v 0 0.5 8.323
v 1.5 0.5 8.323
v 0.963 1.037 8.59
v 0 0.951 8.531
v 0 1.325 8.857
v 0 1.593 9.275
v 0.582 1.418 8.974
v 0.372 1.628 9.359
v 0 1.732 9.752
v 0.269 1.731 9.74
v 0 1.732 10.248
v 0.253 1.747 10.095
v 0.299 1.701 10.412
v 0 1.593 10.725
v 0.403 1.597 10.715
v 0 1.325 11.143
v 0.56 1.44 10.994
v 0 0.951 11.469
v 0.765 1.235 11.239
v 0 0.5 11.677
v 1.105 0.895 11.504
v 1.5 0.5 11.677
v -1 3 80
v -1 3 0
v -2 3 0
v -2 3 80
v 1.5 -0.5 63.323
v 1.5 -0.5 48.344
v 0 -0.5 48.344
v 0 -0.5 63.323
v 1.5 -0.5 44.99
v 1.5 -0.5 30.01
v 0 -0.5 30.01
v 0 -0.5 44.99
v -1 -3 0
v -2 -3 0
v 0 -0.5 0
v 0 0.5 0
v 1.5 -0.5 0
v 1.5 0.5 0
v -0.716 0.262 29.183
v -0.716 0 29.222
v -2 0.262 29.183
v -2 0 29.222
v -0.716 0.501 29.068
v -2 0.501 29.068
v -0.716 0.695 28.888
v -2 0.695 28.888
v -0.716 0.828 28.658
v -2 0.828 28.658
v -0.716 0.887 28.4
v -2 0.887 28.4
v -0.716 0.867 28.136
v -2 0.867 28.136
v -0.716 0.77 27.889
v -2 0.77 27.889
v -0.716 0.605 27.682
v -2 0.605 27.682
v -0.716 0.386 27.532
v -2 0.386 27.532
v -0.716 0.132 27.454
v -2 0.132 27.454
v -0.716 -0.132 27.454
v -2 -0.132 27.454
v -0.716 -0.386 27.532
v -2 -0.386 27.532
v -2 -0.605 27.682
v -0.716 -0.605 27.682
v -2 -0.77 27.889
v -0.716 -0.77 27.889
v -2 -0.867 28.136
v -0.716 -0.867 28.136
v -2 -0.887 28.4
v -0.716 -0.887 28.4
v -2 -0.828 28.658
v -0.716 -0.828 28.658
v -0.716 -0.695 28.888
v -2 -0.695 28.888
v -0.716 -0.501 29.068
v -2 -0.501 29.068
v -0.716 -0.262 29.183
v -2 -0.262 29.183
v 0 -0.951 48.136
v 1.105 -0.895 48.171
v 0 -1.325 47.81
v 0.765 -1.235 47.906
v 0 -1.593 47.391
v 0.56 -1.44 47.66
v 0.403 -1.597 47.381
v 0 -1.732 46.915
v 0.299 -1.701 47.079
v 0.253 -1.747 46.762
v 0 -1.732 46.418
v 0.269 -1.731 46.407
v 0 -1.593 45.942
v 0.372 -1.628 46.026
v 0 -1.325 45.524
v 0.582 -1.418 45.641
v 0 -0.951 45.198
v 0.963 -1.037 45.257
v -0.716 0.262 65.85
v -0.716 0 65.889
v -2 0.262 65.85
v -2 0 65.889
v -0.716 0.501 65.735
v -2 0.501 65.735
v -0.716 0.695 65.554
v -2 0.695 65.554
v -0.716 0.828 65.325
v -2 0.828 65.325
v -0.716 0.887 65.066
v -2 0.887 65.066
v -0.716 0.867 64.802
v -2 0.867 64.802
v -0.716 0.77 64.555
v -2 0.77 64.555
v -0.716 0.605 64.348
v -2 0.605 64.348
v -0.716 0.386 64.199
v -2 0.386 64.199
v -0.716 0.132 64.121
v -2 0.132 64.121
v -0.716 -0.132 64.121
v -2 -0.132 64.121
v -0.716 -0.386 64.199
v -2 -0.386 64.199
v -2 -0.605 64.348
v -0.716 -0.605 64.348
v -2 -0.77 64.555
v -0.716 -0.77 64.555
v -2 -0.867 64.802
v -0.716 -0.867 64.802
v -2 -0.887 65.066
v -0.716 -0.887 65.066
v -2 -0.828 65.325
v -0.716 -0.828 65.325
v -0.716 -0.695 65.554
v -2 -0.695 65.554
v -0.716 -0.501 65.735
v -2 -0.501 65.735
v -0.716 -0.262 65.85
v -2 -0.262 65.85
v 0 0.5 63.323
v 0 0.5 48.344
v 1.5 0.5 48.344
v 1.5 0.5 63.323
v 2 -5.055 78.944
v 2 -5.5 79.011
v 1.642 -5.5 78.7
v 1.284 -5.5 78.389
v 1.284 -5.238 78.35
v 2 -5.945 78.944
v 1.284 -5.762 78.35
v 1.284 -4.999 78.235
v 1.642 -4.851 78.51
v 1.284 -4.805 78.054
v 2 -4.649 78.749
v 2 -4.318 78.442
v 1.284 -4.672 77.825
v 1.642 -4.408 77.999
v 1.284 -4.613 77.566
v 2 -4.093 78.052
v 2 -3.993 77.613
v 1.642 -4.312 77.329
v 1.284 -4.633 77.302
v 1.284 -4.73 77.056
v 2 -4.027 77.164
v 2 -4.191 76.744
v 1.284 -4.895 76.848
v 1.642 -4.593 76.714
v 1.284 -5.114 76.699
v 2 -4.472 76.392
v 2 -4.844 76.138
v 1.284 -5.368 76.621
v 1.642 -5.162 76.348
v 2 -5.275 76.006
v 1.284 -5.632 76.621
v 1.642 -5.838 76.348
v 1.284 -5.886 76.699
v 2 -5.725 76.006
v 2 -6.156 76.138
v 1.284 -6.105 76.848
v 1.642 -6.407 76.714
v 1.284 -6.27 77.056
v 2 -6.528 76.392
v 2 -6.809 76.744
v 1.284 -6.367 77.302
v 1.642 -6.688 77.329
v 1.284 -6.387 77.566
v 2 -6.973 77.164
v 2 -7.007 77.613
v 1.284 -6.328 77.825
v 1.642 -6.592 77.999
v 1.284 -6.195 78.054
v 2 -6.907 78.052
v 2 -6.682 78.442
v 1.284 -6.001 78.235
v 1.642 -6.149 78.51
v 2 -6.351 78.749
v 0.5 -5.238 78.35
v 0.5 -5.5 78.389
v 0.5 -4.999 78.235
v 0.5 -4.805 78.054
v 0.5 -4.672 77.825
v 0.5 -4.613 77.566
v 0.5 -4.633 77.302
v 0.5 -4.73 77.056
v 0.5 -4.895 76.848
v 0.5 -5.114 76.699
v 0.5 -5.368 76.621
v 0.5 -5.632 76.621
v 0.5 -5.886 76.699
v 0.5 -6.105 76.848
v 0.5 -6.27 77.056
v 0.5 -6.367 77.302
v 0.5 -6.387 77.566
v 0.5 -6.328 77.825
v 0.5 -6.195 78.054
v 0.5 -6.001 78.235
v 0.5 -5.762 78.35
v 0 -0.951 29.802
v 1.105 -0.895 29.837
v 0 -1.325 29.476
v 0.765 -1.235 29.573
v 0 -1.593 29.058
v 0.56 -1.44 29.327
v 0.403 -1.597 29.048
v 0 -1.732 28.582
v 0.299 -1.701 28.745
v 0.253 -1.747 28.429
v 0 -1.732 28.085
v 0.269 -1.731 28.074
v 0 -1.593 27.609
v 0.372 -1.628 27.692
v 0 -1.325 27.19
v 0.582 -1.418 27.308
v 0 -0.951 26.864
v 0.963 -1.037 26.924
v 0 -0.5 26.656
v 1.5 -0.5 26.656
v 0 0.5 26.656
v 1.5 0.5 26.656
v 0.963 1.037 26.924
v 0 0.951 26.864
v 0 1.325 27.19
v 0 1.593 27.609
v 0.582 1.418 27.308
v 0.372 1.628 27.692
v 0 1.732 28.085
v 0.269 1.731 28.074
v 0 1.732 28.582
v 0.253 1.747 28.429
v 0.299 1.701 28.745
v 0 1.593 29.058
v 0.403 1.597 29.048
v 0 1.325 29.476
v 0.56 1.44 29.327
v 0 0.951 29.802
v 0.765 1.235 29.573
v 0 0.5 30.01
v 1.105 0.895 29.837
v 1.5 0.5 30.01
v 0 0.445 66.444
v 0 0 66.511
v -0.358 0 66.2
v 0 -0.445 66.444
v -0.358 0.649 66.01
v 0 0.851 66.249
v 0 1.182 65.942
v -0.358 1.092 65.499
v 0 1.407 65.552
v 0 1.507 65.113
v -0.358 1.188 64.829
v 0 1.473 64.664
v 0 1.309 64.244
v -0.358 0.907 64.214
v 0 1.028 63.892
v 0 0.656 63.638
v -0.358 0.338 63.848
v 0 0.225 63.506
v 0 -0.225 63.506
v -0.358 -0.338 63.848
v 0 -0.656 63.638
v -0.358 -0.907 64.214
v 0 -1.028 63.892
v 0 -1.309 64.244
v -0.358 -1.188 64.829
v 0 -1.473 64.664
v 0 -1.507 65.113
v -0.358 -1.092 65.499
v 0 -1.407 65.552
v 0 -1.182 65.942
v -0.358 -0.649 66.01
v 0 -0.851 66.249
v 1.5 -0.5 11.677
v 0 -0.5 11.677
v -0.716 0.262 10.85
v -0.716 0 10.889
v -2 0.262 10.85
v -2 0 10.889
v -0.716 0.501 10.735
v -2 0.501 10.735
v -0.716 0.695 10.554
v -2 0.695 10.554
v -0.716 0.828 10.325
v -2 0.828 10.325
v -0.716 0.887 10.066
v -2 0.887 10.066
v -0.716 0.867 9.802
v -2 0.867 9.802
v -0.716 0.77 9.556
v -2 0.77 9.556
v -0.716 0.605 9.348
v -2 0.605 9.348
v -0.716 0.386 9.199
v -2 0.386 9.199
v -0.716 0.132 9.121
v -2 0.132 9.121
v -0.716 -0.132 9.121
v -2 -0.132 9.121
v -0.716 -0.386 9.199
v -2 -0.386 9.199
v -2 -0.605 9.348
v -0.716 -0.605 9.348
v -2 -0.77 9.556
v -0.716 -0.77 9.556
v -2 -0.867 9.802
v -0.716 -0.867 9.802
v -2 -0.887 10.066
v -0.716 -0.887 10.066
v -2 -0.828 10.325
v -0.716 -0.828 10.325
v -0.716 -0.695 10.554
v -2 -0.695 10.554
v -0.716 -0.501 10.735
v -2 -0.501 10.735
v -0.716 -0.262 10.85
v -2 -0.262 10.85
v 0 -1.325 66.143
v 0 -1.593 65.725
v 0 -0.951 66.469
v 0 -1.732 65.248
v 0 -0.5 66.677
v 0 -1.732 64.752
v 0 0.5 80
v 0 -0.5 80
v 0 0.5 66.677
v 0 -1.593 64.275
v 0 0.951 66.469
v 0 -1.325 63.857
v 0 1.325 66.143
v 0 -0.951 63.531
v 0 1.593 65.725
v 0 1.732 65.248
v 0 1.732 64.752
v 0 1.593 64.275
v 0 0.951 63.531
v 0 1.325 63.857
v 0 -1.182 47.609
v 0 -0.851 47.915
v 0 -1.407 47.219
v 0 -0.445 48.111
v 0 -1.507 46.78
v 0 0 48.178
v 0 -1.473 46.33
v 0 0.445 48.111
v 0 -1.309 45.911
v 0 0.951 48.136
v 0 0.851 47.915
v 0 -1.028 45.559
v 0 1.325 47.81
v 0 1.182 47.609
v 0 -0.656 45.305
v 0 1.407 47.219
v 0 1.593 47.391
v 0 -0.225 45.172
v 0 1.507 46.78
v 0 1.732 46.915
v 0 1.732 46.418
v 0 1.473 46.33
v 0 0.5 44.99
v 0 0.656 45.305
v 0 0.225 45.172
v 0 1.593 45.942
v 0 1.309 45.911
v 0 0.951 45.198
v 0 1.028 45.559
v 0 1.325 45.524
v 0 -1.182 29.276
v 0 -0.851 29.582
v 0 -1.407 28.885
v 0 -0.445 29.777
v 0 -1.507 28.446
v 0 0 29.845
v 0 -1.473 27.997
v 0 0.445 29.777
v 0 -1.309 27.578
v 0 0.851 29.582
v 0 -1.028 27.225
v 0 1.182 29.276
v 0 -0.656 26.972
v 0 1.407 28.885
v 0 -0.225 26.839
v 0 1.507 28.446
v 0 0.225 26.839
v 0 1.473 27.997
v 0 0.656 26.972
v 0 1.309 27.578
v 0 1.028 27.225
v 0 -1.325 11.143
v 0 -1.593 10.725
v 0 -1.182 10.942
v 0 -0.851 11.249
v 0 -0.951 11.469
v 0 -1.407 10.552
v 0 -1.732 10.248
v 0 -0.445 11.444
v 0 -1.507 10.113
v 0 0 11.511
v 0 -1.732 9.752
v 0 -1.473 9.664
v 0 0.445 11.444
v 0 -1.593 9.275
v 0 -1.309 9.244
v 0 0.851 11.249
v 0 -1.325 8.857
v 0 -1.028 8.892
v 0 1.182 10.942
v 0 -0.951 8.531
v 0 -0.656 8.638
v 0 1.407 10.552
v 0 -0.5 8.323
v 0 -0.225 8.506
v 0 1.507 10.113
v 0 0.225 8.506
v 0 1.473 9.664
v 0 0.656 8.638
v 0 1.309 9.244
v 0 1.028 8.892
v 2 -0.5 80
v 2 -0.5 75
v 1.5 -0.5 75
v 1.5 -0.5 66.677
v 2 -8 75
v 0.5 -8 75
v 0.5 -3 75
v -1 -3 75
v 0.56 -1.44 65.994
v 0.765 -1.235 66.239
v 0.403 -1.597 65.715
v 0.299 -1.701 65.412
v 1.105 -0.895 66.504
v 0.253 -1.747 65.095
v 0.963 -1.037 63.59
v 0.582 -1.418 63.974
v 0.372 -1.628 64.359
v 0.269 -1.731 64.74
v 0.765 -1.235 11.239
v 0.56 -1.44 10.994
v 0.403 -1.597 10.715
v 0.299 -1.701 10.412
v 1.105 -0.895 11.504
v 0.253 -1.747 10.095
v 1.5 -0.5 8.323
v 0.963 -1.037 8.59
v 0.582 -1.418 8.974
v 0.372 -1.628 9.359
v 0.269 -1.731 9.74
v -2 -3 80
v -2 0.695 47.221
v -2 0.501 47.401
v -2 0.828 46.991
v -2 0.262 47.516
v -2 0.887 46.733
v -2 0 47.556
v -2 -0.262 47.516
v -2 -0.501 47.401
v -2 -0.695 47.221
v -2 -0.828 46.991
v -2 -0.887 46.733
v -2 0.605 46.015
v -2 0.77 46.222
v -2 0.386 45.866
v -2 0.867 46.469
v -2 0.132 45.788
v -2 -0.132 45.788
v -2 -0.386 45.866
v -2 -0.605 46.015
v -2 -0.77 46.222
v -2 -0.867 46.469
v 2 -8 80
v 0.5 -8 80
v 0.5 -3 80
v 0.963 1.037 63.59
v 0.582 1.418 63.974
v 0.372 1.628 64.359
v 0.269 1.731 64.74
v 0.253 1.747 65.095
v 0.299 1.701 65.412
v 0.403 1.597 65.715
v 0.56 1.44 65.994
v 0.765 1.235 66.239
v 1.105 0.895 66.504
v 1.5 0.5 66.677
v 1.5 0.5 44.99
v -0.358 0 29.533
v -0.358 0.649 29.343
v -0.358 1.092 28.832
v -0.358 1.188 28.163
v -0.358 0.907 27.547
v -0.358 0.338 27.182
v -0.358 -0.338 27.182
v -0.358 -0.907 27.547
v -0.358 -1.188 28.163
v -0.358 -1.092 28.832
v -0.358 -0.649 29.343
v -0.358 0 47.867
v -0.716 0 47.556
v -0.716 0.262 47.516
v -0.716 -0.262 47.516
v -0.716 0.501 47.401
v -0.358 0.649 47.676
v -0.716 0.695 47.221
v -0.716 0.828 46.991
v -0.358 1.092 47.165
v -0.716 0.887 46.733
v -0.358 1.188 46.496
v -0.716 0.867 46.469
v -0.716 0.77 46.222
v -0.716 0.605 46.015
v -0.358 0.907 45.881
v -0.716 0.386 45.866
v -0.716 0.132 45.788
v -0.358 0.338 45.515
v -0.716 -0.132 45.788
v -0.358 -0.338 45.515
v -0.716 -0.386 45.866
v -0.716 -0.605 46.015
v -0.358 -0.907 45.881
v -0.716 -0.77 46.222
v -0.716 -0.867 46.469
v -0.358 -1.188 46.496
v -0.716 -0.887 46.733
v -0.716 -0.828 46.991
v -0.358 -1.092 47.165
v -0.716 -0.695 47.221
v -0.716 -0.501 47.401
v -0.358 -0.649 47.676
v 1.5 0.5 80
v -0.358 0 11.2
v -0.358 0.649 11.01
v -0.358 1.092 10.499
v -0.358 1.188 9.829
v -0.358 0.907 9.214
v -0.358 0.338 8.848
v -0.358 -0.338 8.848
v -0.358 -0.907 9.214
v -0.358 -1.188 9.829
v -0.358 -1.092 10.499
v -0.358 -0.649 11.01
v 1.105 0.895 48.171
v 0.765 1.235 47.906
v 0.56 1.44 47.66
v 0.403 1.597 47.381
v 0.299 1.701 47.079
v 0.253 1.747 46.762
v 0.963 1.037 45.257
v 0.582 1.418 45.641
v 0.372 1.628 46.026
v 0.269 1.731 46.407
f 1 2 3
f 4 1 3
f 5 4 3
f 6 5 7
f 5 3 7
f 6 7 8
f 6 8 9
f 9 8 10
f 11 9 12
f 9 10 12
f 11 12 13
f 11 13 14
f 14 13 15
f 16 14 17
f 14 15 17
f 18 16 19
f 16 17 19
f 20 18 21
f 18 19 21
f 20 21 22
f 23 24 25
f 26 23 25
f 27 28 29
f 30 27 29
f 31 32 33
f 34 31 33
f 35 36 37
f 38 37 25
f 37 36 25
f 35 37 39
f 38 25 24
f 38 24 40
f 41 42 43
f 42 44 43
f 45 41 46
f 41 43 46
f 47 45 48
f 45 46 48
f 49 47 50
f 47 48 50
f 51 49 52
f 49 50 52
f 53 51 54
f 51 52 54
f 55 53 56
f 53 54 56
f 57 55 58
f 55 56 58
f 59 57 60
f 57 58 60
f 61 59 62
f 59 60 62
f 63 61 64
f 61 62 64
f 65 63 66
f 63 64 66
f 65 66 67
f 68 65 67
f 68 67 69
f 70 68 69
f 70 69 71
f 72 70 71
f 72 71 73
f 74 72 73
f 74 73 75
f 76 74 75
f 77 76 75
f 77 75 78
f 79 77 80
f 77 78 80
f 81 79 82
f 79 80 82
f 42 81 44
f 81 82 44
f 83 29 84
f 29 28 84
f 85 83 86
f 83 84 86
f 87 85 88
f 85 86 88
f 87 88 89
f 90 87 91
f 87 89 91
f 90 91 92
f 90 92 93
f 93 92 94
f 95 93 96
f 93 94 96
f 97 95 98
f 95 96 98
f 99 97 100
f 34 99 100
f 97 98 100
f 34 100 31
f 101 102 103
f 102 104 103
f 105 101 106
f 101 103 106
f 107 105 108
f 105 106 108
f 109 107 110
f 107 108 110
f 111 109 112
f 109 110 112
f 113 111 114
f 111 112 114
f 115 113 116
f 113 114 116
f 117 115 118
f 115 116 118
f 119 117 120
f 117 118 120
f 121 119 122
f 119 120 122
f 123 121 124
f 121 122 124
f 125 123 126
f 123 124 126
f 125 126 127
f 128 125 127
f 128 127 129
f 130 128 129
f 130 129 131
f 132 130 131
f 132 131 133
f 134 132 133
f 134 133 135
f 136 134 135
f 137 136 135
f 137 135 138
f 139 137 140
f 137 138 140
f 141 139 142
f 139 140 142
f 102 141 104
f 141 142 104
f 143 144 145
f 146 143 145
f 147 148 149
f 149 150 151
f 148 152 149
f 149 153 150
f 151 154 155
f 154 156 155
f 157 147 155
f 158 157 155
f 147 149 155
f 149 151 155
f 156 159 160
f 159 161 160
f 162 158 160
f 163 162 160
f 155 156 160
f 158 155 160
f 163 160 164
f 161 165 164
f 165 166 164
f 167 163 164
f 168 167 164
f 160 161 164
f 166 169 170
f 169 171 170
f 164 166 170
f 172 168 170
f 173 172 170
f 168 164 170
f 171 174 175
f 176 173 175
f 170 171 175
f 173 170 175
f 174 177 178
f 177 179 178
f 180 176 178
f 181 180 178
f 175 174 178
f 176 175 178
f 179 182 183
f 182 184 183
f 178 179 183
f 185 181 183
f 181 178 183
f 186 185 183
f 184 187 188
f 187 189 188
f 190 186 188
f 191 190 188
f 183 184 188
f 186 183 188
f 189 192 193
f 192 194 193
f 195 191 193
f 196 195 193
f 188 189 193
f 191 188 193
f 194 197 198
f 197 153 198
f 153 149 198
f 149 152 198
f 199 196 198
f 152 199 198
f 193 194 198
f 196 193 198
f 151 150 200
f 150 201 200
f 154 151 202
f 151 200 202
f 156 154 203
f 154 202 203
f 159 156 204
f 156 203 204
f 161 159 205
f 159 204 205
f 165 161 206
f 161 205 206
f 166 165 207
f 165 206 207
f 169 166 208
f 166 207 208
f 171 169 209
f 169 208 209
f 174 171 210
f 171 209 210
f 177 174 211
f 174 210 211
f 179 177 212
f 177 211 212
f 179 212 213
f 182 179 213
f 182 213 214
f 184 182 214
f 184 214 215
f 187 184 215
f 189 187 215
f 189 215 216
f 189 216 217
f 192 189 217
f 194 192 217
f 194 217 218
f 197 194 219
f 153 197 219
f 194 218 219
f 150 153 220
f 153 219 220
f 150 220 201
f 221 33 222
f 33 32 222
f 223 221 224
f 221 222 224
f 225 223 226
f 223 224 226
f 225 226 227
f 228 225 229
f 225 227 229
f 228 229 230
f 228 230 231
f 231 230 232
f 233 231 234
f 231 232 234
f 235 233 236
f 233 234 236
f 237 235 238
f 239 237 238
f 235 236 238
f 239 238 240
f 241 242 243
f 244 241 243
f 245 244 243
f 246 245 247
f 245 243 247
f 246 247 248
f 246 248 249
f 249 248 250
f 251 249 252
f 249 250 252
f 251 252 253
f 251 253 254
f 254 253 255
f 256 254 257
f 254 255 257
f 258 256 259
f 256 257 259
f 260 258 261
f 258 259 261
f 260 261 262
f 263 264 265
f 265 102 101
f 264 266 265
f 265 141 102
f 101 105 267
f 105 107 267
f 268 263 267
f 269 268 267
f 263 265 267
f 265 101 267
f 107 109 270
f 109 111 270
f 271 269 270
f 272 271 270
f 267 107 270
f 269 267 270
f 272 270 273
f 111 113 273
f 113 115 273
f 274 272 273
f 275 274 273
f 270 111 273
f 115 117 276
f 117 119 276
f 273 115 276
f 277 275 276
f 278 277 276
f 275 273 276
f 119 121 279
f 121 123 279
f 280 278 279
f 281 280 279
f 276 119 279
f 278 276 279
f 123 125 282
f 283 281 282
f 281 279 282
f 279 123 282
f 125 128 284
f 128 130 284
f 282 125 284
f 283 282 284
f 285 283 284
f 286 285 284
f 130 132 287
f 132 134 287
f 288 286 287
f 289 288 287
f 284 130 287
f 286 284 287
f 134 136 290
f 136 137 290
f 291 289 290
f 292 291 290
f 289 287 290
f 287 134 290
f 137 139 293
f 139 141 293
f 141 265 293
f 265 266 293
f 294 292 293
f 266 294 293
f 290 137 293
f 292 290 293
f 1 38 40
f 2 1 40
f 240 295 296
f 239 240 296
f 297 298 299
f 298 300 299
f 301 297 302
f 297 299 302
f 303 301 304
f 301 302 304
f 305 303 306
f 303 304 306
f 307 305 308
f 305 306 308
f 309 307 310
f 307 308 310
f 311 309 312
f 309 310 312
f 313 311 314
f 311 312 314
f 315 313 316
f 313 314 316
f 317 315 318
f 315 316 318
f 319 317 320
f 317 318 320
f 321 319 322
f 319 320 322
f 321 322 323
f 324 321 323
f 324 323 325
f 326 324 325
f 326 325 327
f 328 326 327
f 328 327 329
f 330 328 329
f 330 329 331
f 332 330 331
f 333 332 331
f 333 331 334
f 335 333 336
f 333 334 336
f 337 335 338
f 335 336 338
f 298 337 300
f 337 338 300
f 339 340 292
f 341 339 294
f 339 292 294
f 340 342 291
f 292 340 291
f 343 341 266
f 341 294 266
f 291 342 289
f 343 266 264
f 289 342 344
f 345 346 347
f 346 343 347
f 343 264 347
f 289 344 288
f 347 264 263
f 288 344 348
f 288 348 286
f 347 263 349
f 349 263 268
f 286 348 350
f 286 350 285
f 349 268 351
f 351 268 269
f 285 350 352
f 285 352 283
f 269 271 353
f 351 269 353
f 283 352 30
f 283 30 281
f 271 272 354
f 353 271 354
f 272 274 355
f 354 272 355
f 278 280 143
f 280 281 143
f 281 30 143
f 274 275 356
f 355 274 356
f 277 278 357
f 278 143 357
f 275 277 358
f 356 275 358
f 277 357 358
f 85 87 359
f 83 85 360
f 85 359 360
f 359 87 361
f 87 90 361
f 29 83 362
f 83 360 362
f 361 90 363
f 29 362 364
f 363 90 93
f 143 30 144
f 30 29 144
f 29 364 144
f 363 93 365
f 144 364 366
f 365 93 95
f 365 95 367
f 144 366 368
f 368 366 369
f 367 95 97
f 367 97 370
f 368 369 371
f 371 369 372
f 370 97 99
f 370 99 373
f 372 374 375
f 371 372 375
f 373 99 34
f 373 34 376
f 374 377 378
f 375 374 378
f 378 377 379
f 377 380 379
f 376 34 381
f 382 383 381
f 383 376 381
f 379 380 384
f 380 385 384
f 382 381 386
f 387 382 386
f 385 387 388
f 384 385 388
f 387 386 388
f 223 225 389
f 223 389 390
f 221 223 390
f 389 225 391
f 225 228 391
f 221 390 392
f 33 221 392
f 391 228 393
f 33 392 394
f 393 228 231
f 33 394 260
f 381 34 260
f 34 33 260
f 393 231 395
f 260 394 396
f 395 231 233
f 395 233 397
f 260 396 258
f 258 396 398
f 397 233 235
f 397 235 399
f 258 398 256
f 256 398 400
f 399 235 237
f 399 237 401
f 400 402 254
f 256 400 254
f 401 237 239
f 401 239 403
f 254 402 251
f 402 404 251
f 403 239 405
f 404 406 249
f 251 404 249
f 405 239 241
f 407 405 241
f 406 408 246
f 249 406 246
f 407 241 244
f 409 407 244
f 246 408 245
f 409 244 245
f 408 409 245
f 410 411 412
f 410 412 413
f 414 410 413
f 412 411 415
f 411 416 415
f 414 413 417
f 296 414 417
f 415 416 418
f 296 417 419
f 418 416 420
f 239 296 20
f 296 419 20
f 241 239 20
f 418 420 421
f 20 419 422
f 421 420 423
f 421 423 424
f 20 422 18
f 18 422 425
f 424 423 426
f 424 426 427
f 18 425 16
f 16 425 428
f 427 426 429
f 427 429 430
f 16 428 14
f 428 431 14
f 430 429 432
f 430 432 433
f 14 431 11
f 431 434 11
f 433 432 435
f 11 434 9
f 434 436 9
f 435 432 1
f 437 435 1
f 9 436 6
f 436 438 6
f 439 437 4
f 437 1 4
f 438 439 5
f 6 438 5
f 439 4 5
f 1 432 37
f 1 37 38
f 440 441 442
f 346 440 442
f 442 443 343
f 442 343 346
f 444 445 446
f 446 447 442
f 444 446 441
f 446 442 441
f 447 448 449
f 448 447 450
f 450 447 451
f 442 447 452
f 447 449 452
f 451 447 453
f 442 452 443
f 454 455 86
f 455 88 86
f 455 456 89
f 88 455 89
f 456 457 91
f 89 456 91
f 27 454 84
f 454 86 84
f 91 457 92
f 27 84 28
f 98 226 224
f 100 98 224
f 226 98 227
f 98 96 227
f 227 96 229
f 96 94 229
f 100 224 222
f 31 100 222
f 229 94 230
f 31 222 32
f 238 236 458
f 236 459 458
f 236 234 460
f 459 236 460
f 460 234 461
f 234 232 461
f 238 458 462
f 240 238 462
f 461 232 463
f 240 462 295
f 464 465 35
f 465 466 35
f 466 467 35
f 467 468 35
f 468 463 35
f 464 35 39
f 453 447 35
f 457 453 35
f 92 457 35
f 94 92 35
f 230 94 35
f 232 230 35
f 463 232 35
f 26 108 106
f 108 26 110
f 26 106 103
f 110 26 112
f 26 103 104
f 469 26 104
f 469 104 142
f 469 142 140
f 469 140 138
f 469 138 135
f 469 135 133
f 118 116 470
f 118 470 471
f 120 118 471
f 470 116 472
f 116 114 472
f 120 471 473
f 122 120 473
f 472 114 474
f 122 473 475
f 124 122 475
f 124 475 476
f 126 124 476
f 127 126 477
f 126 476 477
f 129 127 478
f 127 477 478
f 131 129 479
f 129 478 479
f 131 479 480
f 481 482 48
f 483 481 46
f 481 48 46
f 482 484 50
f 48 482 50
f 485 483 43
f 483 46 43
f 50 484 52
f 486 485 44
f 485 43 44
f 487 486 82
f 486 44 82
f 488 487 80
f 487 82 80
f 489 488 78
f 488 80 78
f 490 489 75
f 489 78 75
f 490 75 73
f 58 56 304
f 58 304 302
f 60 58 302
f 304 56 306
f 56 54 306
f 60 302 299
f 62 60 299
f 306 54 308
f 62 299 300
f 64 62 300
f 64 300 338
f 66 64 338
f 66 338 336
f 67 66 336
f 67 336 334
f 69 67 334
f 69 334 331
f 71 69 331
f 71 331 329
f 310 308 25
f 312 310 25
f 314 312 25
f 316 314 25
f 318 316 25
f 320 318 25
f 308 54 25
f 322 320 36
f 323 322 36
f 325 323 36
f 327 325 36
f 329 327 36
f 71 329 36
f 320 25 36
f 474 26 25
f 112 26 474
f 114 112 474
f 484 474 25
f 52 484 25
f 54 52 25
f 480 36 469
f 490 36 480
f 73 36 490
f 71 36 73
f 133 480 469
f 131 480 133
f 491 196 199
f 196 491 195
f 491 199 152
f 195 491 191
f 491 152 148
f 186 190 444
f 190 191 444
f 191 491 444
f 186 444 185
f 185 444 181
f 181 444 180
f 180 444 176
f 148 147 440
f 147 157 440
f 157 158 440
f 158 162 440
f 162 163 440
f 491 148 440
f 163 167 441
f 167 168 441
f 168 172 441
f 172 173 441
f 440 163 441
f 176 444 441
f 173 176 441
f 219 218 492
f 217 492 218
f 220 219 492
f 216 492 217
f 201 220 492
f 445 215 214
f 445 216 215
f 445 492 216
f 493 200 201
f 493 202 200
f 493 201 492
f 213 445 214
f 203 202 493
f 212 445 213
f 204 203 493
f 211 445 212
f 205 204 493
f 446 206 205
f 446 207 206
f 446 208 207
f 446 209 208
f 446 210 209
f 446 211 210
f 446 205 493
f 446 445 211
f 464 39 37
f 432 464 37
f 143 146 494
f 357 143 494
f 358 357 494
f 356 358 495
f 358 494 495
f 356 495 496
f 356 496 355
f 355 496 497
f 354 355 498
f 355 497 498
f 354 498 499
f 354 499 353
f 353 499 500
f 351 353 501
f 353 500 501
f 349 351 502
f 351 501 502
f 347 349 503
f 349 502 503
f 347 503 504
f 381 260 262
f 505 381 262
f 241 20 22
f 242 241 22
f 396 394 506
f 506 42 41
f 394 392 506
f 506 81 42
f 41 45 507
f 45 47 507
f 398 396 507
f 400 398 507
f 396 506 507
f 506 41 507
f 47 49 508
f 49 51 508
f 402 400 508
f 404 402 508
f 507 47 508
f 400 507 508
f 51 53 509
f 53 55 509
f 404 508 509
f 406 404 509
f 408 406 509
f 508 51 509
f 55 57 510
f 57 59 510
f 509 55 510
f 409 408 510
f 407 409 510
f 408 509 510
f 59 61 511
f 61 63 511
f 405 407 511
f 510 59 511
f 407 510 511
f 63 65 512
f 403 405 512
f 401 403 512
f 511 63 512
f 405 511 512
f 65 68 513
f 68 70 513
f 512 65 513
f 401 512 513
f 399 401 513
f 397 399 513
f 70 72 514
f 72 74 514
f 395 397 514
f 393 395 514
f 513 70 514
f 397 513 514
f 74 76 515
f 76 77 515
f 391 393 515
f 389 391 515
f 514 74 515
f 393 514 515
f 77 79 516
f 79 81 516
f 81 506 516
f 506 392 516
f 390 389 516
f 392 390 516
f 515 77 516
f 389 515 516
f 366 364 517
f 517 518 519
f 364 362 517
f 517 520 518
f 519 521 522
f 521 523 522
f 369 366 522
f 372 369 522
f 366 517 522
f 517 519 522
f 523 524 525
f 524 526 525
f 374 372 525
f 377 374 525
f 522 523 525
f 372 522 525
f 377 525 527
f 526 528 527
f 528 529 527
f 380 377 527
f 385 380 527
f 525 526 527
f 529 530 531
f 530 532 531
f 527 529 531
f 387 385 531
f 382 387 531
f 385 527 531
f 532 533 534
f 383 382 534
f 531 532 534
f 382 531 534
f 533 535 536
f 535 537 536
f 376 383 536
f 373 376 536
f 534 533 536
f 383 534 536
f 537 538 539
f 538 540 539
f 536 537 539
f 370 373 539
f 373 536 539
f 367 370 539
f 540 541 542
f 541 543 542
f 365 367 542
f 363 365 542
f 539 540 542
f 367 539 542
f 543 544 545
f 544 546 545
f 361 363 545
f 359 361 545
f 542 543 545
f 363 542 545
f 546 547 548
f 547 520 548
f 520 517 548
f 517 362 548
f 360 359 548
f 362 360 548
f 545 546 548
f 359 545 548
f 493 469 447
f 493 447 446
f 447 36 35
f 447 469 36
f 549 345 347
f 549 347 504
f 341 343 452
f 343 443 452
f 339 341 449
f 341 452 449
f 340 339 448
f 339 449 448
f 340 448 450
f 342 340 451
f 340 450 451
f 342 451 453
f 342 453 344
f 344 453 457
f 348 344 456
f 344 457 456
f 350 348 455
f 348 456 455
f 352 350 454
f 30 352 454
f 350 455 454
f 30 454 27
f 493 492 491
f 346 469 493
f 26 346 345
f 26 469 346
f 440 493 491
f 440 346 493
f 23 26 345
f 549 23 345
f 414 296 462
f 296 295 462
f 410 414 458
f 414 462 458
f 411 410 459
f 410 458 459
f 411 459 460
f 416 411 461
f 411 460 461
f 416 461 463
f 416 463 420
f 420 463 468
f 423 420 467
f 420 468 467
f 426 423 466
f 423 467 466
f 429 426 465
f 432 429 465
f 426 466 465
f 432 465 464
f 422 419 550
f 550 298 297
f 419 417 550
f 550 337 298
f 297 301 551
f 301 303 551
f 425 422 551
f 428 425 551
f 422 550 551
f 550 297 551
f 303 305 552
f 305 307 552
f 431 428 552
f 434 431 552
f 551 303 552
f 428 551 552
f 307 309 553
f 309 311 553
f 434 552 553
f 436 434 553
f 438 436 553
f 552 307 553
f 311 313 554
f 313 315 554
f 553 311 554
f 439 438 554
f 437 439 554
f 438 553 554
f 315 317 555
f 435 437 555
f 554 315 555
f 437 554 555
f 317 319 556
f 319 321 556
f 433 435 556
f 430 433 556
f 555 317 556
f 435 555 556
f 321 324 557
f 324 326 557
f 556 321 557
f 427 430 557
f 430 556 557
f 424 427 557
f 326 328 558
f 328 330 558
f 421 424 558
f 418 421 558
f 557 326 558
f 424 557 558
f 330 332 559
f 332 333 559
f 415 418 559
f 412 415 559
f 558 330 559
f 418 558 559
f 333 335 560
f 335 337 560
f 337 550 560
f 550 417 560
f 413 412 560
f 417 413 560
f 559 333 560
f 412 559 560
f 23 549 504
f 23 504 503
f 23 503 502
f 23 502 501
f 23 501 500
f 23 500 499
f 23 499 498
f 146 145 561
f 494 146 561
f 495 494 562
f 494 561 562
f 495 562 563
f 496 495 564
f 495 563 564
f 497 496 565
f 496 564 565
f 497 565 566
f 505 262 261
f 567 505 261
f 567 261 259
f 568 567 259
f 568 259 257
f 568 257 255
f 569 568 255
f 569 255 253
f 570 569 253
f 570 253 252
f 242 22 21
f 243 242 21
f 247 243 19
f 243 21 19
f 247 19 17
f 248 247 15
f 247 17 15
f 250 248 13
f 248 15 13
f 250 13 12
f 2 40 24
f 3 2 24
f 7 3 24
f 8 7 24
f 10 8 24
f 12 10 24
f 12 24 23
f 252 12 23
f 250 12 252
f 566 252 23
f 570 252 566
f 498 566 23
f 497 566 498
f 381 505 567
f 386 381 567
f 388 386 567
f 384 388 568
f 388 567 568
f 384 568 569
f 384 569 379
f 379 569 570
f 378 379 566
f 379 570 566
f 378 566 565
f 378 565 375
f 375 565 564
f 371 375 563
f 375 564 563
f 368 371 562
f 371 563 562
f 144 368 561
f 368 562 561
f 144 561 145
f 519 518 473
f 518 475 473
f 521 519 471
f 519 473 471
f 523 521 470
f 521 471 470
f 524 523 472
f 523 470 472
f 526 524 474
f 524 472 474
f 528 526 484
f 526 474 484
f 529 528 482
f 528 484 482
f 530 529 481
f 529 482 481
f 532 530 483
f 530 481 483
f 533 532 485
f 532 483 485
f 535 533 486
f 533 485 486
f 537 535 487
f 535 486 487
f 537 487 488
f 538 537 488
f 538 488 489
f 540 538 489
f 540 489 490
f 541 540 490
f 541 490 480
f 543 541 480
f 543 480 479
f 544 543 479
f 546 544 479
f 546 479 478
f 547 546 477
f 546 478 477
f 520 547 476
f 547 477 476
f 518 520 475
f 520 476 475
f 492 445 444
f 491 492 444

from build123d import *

# Parameters (mm, degrees)
BOSS_EXTRUDE1_DEPTH                            = 75
SKETCH5_R                                      = 1.75
CUT_EXTRUDE1_DEPTH                             = 2
CSK_FOR_0_FLAT_HEAD_MACHINE_SCREW2_D           = 1.778
CSK_FOR_0_FLAT_HEAD_MACHINE_SCREW2_DEPTH       = 3.302
CSK_FOR_0_FLAT_HEAD_MACHINE_SCREW2_CSINK_D     = 3.0226
CSK_FOR_0_FLAT_HEAD_MACHINE_SCREW2_CSINK_ANGLE = 82
CSK_FOR_0_FLAT_HEAD_MACHINE_SCREW2_TIP         = 0.53416509
CHAMFER1_SIZE                                  = 3
SKETCH6_W                                      = 1.5
SKETCH6_H                                      = 5
BOSS_EXTRUDE2_DEPTH                            = 5
CSK_FOR_0_FLAT_HEAD_MACHINE_SCREW1_D           = 1.778
CSK_FOR_0_FLAT_HEAD_MACHINE_SCREW1_DEPTH       = 3.302
CSK_FOR_0_FLAT_HEAD_MACHINE_SCREW1_CSINK_D     = 3.0226
CSK_FOR_0_FLAT_HEAD_MACHINE_SCREW1_CSINK_ANGLE = 82
CSK_FOR_0_FLAT_HEAD_MACHINE_SCREW1_TIP         = 0.53416509


with BuildPart() as part:
    # Sketch1 → Boss-Extrude1 (new body)
    with BuildSketch(Plane.XY):
        Polygon((-2, -3), (2, -3), (2, -0.5), (0, -0.5), (0, 0.5), (2, 0.5), (2, 3), (-2, 3), align=None)
    extrude(amount=BOSS_EXTRUDE1_DEPTH)

    # Sketch5 → Cut-Extrude1 (cut)
    with BuildSketch(Plane(origin=(2, 0, 0), x_dir=(0, 0, -1), z_dir=(1, 0, 0))):
        with Locations((-65, 0)):
            Circle(SKETCH5_R)
        with Locations((-46.66667, 0)):
            Circle(SKETCH5_R)
        with Locations((-28.33334, 0)):
            Circle(SKETCH5_R)
        with Locations((-10.00001, 0)):
            Circle(SKETCH5_R)
    extrude(amount=-CUT_EXTRUDE1_DEPTH, mode=Mode.SUBTRACT)

    # CSK for #0 Flat Head Machine Screw2
    with Locations(Plane(origin=(0, 0, 0), x_dir=(0, 0, -1), z_dir=(1, 0, 0))):
        with Locations((-65, 0), (-10.00001, 0), (-46.66667, 0), (-28.33334, 0)):
            CounterSinkHole(CSK_FOR_0_FLAT_HEAD_MACHINE_SCREW2_D / 2, CSK_FOR_0_FLAT_HEAD_MACHINE_SCREW2_CSINK_D / 2, depth=CSK_FOR_0_FLAT_HEAD_MACHINE_SCREW2_DEPTH, counter_sink_angle=CSK_FOR_0_FLAT_HEAD_MACHINE_SCREW2_CSINK_ANGLE)
            with Locations((0, 0, -(CSK_FOR_0_FLAT_HEAD_MACHINE_SCREW2_DEPTH + CSK_FOR_0_FLAT_HEAD_MACHINE_SCREW2_TIP / 2))):  # 118° drill point
                Cone(0, CSK_FOR_0_FLAT_HEAD_MACHINE_SCREW2_D / 2, CSK_FOR_0_FLAT_HEAD_MACHINE_SCREW2_TIP, mode=Mode.SUBTRACT)

    # Chamfer1
    # the kernel refuses this chamfer: 3 mm, written as the material it takes off along each edge
    with BuildSketch(Plane(origin=(2, -3, -7.715048964), x_dir=(-0.9996219169112968, -0.027495876610586348, 0), z_dir=(0, 0, 1))) as chamfer1_piece_1:
        Polygon((CHAMFER1_SIZE * 0.999621916911, -CHAMFER1_SIZE * 0.0274958766106), (-CHAMFER1_SIZE * 0.0274958766106, -CHAMFER1_SIZE * 0.999621916911), (0, 0), align=None)
    extrude(amount=90.430097928, mode=Mode.SUBTRACT)
    with BuildSketch(Plane(origin=(2, 3, -7.715048964), x_dir=(-0.9996219169112968, 0.027495876610586348, 0), z_dir=(0, 0, 1))) as chamfer1_piece_2:
        Polygon((CHAMFER1_SIZE * 0.999621916911, CHAMFER1_SIZE * 0.0274958766106), (-CHAMFER1_SIZE * 0.0274958766106, CHAMFER1_SIZE * 0.999621916911), (0, 0), align=None)
    extrude(amount=90.430097928, mode=Mode.SUBTRACT)

    # Sketch6 → Boss-Extrude2 (add)
    with BuildSketch(Plane.XY.offset(75)):
        Polygon((-2, 3), (-2, -3), (-1, -3), (1.5, -0.5), (0, -0.5), (0, 0.5), (1.5, 0.5), (-1, 3), align=None)
        Polygon((1.5, -0.5), (-1, -3), (0.5, -3), (2, -3), (2, -0.5), align=None)
        with Locations((1.25, -5.5)):
            Rectangle(SKETCH6_W, SKETCH6_H)
    extrude(amount=BOSS_EXTRUDE2_DEPTH)

    # CSK for #0 Flat Head Machine Screw1
    with Locations(Plane(origin=(2, 0, 0), x_dir=(0, 0, -1), z_dir=(1, 0, 0))):
        with Locations((-77.5, -5.5)):
            CounterSinkHole(CSK_FOR_0_FLAT_HEAD_MACHINE_SCREW1_D / 2, CSK_FOR_0_FLAT_HEAD_MACHINE_SCREW1_CSINK_D / 2, depth=CSK_FOR_0_FLAT_HEAD_MACHINE_SCREW1_DEPTH, counter_sink_angle=CSK_FOR_0_FLAT_HEAD_MACHINE_SCREW1_CSINK_ANGLE)
            with Locations((0, 0, -(CSK_FOR_0_FLAT_HEAD_MACHINE_SCREW1_DEPTH + CSK_FOR_0_FLAT_HEAD_MACHINE_SCREW1_TIP / 2))):  # 118° drill point
                Cone(0, CSK_FOR_0_FLAT_HEAD_MACHINE_SCREW1_D / 2, CSK_FOR_0_FLAT_HEAD_MACHINE_SCREW1_TIP, mode=Mode.SUBTRACT)


solid = part.part
